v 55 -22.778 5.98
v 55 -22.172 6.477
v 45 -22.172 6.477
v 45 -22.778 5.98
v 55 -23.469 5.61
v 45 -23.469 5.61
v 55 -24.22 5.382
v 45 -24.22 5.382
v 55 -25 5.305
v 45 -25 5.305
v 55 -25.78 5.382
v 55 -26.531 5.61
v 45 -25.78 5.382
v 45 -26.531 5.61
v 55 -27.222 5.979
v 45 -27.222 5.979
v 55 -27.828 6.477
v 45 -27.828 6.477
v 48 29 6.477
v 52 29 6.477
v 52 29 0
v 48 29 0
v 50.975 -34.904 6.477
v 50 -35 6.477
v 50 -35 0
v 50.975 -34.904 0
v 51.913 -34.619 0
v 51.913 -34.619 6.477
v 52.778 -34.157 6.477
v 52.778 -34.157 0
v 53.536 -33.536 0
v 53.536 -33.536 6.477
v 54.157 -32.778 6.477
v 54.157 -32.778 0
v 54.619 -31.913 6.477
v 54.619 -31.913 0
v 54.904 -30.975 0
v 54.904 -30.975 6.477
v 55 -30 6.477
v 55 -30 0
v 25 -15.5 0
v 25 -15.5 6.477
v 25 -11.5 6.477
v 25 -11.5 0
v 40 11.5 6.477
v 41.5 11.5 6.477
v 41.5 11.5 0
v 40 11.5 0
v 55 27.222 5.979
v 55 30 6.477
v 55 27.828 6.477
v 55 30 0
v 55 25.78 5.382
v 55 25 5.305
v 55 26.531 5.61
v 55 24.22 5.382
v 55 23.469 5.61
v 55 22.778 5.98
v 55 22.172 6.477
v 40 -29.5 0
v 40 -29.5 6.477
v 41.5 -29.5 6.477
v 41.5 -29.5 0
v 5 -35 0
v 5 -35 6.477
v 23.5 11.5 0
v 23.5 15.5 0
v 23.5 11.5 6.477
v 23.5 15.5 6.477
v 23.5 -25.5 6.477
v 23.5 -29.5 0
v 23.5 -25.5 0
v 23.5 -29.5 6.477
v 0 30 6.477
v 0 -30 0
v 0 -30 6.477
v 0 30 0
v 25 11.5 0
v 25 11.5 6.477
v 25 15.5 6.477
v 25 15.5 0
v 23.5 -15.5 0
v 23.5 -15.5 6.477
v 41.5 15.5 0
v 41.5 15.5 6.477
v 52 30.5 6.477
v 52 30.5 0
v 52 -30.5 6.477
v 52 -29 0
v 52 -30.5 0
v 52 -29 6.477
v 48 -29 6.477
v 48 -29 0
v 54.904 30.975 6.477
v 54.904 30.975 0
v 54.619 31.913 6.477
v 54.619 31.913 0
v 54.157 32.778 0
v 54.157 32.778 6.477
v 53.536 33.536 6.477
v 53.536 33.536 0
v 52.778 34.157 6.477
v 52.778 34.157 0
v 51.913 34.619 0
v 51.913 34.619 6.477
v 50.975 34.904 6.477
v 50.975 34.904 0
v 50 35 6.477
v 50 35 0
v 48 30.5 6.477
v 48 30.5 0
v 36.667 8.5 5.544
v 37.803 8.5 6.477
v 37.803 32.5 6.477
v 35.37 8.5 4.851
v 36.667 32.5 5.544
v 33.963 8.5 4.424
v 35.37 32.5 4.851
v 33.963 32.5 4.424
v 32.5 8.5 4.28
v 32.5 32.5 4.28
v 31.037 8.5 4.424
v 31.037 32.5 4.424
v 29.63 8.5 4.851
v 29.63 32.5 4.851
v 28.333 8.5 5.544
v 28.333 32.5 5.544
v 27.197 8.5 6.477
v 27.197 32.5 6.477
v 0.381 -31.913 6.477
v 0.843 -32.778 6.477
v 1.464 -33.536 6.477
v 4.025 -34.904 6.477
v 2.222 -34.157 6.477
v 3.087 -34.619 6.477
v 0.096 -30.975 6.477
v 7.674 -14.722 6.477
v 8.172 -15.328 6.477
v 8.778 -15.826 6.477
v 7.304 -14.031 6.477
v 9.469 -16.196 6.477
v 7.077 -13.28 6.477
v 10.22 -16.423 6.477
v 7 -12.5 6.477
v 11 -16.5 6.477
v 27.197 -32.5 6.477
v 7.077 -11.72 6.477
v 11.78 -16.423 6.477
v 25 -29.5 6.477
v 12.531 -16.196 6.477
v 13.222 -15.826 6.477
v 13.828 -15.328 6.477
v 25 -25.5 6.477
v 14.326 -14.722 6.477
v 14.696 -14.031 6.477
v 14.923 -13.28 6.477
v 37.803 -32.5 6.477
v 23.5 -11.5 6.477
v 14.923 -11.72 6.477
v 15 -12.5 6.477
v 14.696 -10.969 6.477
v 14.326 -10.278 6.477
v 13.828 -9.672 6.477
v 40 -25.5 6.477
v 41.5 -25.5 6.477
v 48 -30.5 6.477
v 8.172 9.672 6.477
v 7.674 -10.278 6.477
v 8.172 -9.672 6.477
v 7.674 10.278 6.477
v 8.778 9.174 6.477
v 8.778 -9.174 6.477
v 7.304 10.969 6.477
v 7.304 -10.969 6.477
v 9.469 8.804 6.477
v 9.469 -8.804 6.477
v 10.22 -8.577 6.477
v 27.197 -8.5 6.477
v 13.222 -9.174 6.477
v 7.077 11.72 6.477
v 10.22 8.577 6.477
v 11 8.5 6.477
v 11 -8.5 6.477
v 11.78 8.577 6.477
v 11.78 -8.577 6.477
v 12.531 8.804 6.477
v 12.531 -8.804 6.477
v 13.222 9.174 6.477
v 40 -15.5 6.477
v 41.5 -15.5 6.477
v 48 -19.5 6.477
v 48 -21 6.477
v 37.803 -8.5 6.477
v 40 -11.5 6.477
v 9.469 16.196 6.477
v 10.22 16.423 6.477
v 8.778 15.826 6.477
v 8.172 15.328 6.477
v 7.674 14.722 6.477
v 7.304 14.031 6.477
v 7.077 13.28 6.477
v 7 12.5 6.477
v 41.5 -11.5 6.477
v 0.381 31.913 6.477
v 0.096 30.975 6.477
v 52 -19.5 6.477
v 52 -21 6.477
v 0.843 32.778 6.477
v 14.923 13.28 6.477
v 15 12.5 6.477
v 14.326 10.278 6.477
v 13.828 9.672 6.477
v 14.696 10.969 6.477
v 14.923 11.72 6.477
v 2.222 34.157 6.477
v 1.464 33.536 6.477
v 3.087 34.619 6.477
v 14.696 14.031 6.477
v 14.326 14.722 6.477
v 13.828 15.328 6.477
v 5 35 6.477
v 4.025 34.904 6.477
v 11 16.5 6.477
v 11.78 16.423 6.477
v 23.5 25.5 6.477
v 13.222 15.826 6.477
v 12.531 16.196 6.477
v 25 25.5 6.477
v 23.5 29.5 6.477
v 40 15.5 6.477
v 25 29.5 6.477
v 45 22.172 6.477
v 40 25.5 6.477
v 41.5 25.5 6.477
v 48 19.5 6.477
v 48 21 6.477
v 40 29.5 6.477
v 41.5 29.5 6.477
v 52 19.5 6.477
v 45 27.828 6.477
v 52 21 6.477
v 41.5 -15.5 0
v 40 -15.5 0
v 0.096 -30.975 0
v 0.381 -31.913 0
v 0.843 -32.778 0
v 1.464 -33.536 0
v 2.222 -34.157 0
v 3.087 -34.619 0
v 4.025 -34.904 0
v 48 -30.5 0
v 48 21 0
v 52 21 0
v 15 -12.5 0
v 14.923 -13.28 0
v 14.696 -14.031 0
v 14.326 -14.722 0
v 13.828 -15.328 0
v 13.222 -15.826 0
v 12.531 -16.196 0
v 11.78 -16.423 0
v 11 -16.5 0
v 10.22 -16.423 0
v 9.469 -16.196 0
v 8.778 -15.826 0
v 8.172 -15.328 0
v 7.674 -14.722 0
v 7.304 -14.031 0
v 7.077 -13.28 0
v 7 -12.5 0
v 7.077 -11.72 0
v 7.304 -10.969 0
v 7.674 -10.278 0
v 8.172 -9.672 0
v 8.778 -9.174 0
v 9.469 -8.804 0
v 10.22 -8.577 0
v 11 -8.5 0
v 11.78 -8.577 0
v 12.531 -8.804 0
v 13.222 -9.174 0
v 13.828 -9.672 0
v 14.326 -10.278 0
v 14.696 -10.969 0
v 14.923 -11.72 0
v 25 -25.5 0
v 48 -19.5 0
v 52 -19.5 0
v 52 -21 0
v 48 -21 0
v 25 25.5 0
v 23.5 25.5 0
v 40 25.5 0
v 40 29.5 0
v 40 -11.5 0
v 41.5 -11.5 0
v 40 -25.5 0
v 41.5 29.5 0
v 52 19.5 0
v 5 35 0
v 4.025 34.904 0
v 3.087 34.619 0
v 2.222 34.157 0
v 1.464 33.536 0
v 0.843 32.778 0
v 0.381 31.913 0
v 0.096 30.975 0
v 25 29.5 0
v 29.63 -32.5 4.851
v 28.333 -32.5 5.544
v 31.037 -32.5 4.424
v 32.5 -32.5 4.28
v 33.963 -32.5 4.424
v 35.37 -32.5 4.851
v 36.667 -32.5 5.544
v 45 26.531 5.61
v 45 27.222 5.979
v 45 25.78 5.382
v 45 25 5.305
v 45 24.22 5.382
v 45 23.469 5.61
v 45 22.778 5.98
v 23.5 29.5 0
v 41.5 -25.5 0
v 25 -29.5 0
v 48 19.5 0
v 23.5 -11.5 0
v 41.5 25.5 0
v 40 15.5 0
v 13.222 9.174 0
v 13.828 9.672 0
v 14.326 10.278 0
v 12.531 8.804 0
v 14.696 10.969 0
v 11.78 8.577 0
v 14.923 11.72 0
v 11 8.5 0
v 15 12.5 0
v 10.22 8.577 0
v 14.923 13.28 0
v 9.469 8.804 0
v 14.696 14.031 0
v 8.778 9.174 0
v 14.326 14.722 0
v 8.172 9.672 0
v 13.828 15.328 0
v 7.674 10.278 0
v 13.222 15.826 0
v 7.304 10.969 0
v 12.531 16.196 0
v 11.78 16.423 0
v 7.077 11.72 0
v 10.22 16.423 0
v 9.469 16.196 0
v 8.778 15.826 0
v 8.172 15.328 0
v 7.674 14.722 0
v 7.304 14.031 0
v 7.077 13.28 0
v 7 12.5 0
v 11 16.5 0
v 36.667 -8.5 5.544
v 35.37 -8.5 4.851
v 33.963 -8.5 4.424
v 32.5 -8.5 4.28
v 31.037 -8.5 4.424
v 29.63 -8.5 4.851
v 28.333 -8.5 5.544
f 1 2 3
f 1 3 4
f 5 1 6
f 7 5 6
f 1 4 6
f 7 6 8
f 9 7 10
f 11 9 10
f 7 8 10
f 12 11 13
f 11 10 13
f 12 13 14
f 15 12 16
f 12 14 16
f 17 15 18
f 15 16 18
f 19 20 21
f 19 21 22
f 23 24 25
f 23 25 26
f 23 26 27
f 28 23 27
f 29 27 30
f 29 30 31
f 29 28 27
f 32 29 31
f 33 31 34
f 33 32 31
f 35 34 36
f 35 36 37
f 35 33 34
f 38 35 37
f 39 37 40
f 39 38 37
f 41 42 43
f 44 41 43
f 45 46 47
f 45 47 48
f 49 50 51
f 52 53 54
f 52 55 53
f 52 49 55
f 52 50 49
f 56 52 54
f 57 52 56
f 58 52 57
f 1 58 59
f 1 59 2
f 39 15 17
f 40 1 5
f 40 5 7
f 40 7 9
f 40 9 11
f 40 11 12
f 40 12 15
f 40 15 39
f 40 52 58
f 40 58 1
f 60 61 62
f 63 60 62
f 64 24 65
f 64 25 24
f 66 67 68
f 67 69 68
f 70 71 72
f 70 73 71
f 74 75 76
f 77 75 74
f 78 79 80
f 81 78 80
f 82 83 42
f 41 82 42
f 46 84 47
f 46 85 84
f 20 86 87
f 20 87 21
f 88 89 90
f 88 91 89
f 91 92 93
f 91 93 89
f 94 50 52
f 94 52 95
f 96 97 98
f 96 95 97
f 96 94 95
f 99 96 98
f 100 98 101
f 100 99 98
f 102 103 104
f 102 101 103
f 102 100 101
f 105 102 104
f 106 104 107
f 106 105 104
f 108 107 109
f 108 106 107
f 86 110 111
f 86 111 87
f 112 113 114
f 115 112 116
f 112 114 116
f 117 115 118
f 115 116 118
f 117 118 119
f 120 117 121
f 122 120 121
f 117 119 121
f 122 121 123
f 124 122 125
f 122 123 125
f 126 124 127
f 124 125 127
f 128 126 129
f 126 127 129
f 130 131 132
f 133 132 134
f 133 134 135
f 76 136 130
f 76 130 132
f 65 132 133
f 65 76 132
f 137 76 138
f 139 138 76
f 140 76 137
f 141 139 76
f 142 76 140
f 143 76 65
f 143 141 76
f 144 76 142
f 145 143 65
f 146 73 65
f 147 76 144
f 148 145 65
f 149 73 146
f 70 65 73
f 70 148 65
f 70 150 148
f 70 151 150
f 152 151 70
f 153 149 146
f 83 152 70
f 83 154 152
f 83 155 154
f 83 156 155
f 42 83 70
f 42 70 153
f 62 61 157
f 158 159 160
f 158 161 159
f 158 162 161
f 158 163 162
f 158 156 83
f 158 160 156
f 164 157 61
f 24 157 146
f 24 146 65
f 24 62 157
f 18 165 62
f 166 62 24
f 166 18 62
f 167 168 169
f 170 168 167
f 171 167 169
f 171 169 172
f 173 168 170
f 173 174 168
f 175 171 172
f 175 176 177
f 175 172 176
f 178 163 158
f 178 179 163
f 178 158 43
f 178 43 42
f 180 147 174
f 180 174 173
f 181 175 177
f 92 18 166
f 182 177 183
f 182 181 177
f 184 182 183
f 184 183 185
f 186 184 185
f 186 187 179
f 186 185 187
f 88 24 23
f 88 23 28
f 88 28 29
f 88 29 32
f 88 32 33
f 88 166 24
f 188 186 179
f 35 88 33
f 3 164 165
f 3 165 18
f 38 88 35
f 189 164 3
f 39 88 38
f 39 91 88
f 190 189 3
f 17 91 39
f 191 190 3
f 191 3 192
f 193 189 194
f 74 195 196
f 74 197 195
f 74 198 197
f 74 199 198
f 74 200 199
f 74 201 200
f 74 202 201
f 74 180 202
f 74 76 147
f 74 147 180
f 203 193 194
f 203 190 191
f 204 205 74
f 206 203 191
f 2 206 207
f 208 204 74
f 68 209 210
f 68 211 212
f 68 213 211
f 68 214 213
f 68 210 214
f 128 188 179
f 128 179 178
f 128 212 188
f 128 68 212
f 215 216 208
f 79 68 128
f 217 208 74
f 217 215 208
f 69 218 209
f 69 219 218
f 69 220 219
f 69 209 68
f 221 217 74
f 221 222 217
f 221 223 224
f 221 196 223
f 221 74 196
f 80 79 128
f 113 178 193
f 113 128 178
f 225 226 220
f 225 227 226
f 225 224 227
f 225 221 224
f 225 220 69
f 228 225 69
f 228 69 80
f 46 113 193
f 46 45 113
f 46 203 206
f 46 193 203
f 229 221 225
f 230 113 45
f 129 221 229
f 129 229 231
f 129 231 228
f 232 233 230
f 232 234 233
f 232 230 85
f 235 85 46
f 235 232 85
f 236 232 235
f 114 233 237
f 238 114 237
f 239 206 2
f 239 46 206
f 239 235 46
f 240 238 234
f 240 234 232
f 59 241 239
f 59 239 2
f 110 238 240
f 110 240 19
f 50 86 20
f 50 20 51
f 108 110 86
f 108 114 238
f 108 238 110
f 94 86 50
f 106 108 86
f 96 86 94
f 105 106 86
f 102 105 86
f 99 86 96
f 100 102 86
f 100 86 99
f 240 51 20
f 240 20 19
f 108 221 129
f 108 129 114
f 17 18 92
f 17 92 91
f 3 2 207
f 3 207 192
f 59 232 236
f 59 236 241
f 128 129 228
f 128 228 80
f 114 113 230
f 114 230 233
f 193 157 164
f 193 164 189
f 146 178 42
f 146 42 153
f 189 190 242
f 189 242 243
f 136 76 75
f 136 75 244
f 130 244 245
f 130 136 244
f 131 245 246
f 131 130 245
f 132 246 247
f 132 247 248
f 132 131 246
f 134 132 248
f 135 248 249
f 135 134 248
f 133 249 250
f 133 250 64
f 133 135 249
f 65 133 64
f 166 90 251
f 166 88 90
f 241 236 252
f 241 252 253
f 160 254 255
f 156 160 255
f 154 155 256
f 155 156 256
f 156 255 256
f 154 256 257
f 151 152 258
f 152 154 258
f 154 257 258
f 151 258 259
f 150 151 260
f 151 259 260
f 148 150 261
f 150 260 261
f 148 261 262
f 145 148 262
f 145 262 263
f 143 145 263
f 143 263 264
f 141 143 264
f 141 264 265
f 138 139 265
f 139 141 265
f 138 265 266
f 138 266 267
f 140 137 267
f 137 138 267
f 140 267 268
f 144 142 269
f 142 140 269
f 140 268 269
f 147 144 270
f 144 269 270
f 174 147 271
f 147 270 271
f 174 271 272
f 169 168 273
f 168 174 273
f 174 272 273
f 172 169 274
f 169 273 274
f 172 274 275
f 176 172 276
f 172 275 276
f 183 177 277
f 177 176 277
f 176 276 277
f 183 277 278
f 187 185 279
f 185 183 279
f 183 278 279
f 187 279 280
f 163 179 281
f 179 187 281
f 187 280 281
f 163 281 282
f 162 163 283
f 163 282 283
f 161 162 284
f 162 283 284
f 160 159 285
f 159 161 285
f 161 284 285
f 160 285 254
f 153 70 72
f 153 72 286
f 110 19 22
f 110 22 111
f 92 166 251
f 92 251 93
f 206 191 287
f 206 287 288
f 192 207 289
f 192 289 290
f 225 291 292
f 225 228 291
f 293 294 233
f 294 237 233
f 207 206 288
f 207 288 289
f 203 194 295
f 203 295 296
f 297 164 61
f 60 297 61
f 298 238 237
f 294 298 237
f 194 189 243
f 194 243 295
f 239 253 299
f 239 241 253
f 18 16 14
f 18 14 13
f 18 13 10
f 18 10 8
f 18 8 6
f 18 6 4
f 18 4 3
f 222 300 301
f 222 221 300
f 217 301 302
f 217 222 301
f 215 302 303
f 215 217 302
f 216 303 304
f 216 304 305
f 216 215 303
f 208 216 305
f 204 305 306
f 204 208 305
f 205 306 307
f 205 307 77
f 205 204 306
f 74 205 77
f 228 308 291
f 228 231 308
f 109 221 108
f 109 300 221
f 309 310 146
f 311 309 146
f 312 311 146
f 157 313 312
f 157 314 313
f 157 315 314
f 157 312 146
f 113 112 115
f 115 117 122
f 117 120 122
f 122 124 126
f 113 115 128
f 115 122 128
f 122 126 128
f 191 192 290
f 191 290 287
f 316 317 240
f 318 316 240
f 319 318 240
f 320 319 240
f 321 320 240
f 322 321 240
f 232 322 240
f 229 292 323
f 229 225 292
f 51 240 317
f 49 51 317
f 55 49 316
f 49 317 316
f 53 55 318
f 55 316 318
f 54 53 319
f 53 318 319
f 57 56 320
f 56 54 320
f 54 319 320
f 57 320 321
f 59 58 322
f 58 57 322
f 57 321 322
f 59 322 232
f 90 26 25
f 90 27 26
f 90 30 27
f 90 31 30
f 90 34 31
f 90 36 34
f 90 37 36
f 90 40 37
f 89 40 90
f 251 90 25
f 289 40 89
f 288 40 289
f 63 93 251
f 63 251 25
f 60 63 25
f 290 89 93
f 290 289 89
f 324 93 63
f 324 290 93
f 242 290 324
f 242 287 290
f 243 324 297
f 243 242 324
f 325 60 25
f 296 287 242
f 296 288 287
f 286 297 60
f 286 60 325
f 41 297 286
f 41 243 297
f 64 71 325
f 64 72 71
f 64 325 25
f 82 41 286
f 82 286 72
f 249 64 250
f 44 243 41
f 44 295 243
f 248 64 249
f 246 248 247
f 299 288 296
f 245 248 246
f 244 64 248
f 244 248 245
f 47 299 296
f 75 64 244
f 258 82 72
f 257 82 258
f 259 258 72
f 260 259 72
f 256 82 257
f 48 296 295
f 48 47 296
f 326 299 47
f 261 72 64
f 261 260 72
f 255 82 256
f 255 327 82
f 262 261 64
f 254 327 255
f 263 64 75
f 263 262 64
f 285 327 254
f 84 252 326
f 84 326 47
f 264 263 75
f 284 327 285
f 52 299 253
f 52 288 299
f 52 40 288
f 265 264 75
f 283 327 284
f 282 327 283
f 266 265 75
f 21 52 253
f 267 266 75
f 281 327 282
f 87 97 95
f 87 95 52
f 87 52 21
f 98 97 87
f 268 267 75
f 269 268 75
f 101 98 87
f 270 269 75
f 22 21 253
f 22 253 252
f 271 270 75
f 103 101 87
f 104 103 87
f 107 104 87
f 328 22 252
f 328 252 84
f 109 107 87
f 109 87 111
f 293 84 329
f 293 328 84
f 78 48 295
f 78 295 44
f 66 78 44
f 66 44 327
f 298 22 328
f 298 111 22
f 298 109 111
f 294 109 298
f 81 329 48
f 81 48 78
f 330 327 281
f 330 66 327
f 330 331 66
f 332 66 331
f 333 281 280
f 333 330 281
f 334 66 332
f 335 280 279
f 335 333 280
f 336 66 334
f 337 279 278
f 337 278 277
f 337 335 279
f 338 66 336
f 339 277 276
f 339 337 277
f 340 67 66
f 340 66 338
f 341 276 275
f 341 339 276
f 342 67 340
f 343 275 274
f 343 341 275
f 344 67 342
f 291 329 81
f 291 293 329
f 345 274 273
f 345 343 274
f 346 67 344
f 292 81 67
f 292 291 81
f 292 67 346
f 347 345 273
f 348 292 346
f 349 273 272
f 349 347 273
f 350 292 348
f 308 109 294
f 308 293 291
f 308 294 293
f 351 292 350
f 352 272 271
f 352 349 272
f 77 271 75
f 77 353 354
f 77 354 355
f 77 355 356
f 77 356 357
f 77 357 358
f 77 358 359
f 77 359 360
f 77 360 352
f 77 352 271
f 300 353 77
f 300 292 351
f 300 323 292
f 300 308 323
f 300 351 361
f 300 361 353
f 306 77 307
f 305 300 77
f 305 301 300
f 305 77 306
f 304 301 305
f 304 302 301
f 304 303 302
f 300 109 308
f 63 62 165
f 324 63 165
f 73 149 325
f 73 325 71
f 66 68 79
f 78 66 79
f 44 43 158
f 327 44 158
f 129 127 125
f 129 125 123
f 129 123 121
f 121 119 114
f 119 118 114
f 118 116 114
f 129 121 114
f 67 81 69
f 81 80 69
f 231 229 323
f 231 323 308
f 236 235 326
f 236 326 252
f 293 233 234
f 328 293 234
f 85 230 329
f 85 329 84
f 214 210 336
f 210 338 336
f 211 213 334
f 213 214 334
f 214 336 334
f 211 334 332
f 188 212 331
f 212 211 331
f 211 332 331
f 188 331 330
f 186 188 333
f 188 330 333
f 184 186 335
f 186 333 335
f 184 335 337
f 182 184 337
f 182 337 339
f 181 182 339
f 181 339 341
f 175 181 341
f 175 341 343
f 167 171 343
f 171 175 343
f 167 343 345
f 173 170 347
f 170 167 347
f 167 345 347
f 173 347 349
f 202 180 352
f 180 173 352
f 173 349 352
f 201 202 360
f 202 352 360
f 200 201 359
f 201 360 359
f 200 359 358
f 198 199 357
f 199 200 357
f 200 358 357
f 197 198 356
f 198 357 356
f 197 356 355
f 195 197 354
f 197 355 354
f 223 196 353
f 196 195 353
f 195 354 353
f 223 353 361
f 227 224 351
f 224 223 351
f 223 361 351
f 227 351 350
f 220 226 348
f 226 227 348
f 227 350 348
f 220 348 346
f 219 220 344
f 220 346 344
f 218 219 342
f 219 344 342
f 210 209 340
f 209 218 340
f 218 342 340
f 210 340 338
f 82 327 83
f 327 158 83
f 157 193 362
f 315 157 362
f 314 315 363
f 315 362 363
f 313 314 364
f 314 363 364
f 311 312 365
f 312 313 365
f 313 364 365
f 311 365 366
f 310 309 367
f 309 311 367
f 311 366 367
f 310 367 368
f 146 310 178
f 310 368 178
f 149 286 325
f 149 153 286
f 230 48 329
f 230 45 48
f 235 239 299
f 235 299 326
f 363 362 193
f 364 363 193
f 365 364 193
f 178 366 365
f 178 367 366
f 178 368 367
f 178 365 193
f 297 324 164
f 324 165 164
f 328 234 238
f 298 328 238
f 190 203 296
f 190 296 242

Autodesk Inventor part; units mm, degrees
ref_plane "YZ Plane" through (0, 0, 0) normal (1, 0, 0) x (0, 1, 0)
ref_plane "XZ Plane" through (0, 0, 0) normal (0, 1, 0) x (-1, 0, 0)
ref_plane "XY Plane" through (0, 0, 0) normal (0, 0, 1) x (1, 0, 0)
sketch "Sketch1" plane through (0, 0, 0) normal (0, 0, 1) x (1, 0, 0)
  line L0 (0, 35) -> (55, 35)
  line L1 (55, -35) -> (0, -35)
  line L2 (0, -35) -> (0, 35)
  line L3 (11, 12.5) -> (11, -12.5) construction
  circle A0 centre (11, 12.5) radius 11 construction
  circle A1 centre (11, -12.5) radius 11 construction
  circle A2 centre (11, 12.5) radius 4
  circle A3 centre (11, -12.5) radius 4
  line L4 (27.1967, 8.5) -> (37.8033, 8.5) construction
  line L5 (37.8033, 8.5) -> (37.8033, -8.5) construction
  line L6 (37.8033, -8.5) -> (27.1967, -8.5) construction
  line L7 (27.1967, -8.5) -> (27.1967, 8.5) construction
  line L8 (37.8033, 8.5) -> (27.1967, 8.5)
  line L9 (27.1967, 8.5) -> (27.1967, 32.5)
  line L10 (27.1967, 32.5) -> (37.8033, 32.5)
  line L11 (37.8033, 32.5) -> (37.8033, 8.5)
  line L12 (37.8033, -8.5) -> (27.1967, -8.5)
  line L13 (27.1967, -8.5) -> (27.1967, -32.5)
  line L14 (27.1967, -32.5) -> (37.8033, -32.5)
  line L15 (37.8033, -32.5) -> (37.8033, -8.5)
  circle A4 centre (32.5, 8.5) radius 7.5 construction
  line L16 (32.5, 8.5) -> (37.8033, 3.1967) construction
  line L17 (55, 27.8284) -> (45, 27.8284)
  line L18 (45, 27.8284) -> (45, 22.1716)
  line L19 (45, 22.1716) -> (55, 22.1716)
  line L20 (55, -27.8284) -> (45, -27.8284)
  line L21 (45, -27.8284) -> (45, -22.1716)
  line L22 (45, -22.1716) -> (55, -22.1716)
  line L23 (55, -27.8284) -> (55, -35)
  line L24 (55, 35) -> (55, 27.8284)
  line L25 (55, 22.1716) -> (55, -22.1716)
  circle A5 centre (45, 25) radius 4 construction
  line L26 (45, 25) -> (42.1716, 22.1716) construction
  point P0 (0, 0)
  point P1 (0, 0)
  point P2 (11, 0)
  point P3 (27.1967, 0)
  point P4 (45, -25)
  dimension "d7" = 15
  dimension "d16" = 8
  dimension "d0" = 70
  dimension "d2" = 11
  dimension "d3" = 25
  dimension "d4" = 8
  dimension "d5" = 24
  dimension "d6" = 45
  dimension "d9" = 2.5
  dimension "d11" = 22.5
  dimension "d12" = 55
  dimension "d13" = 10
  dimension "d15" = 45
  dimension "d17" = 10
extrude "Extrusion1" add sketch "Sketch1" along normal blind 6.477
sketch "Sketch2" plane through (0, 0, 6.477) normal (0, 0, 1) x (1, 0, 0)
  line L0 (27.1967, 8.5) -> (27.1967, 32.5) projected
  line L1 (27.1967, 32.5) -> (37.8033, 32.5) projected
  line L2 (45, 22.1716) -> (45, 27.8284) projected
  line L3 (45, 27.8284) -> (55, 27.8284) projected
  line L4 (25, 25.5) -> (40, 25.5) construction
  line L5 (40, 25.5) -> (40, 15.5) construction
  line L6 (40, 15.5) -> (25, 15.5) construction
  line L7 (25, 15.5) -> (25, 25.5) construction
  line L8 (48, 29) -> (52, 29) construction
  line L9 (52, 29) -> (52, 21) construction
  line L10 (52, 21) -> (48, 21) construction
  line L11 (48, 21) -> (48, 29) construction
  line L12 (25, 25.5) -> (23.5, 25.5)
  line L13 (23.5, 25.5) -> (23.5, 29.5)
  line L14 (23.5, 29.5) -> (25, 29.5)
  line L15 (25, 29.5) -> (25, 25.5)
  line L16 (40, 25.5) -> (41.5, 25.5)
  line L17 (41.5, 25.5) -> (41.5, 29.5)
  line L18 (41.5, 29.5) -> (40, 29.5)
  line L19 (40, 29.5) -> (40, 25.5)
  line L20 (40, 15.5) -> (41.5, 15.5)
  line L21 (41.5, 15.5) -> (41.5, 11.5)
  line L22 (41.5, 11.5) -> (40, 11.5)
  line L23 (40, 11.5) -> (40, 15.5)
  line L24 (25, 15.5) -> (23.5, 15.5)
  line L25 (23.5, 15.5) -> (23.5, 11.5)
  line L26 (23.5, 11.5) -> (25, 11.5)
  line L27 (25, 11.5) -> (25, 15.5)
  line L28 (48, 21) -> (52, 21)
  line L29 (52, 21) -> (52, 19.5)
  line L30 (52, 19.5) -> (48, 19.5)
  line L31 (48, 19.5) -> (48, 21)
  line L32 (52, 29) -> (48, 29)
  line L33 (48, 29) -> (48, 30.5)
  line L34 (48, 30.5) -> (52, 30.5)
  line L35 (52, 30.5) -> (52, 29)
  point P0 (0, 0)
  point P1 (25, 20.5)
  point P2 (27.1967, 20.5)
  point P3 (48, 25)
  point P4 (45, 25)
  point P5 (50, 29)
  point P6 (50, 27.8284)
  point P7 (32.5, 25.5)
  point P8 (32.5, 32.5)
  point P9 (25, 27.5)
  dimension "d20" = 4
  dimension "d22" = 1.5
  dimension "d23" = 8
  dimension "d24" = 15
  dimension "d25" = 5
extrude "Extrusion2" cut sketch "Sketch2" against normal through all
mirror "Mirror1" about plane through (0, 0, 0) normal (0, 1, 0) of "Extrusion2"
fillet "Fillet1" radius 5 4 edges at (55, -35, 3.2385) (0, -35, 3.2385) (0, 35, 3.2385) (55, 35, 3.2385)
sketch "Sketch3" plane through (27.1967, 32.5, 0) normal (0, -1, 0) x (1, 0, 0)
  line L0 (10.6066, 0) -> (0, 0) projected
  line L1 (10.6066, 0) -> (10.6066, 6.477) projected
  line L2 (0, 6.477) -> (10.6066, 6.477) projected
  line L3 (0, 0) -> (0, 6.477) projected
  arc A0 (0, 6.477) -> (10.6066, 6.477) centre (5.3033, 11.7803) ccw
  point P0 (-27.1967, 0)
  dimension "d29" = 15
extrude "Extrusion3" add sketch "Sketch3" along normal up to surface (65 mm away) contours L0 L3 A0 L1
sketch "Sketch4" plane through (45, 22.1716, 0) normal (1, 0, 0) x (0, 0, -1)
  line L0 (0, 5.6569) -> (0, 0) projected
  line L1 (0, 5.6569) -> (-6.477, 5.6569) projected
  line L2 (-6.477, 0) -> (-6.477, 5.6569) projected
  line L3 (0, 0) -> (-6.477, 0) projected
  arc A0 (-6.477, 0) -> (-6.477, 5.6569) centre (-9.3054, 2.8284) ccw
  point P0 (0, -22.1716)
  dimension "d33" = 8
extrude "Extrusion4" add sketch "Sketch4" along normal up to surface (10 mm away) contours L0 L3 A0 L1
mirror "Mirror2" about plane through (0, 0, 0) normal (0, 1, 0) of "Extrusion4"
properties part number "GANTRY SIDE PLATE"
